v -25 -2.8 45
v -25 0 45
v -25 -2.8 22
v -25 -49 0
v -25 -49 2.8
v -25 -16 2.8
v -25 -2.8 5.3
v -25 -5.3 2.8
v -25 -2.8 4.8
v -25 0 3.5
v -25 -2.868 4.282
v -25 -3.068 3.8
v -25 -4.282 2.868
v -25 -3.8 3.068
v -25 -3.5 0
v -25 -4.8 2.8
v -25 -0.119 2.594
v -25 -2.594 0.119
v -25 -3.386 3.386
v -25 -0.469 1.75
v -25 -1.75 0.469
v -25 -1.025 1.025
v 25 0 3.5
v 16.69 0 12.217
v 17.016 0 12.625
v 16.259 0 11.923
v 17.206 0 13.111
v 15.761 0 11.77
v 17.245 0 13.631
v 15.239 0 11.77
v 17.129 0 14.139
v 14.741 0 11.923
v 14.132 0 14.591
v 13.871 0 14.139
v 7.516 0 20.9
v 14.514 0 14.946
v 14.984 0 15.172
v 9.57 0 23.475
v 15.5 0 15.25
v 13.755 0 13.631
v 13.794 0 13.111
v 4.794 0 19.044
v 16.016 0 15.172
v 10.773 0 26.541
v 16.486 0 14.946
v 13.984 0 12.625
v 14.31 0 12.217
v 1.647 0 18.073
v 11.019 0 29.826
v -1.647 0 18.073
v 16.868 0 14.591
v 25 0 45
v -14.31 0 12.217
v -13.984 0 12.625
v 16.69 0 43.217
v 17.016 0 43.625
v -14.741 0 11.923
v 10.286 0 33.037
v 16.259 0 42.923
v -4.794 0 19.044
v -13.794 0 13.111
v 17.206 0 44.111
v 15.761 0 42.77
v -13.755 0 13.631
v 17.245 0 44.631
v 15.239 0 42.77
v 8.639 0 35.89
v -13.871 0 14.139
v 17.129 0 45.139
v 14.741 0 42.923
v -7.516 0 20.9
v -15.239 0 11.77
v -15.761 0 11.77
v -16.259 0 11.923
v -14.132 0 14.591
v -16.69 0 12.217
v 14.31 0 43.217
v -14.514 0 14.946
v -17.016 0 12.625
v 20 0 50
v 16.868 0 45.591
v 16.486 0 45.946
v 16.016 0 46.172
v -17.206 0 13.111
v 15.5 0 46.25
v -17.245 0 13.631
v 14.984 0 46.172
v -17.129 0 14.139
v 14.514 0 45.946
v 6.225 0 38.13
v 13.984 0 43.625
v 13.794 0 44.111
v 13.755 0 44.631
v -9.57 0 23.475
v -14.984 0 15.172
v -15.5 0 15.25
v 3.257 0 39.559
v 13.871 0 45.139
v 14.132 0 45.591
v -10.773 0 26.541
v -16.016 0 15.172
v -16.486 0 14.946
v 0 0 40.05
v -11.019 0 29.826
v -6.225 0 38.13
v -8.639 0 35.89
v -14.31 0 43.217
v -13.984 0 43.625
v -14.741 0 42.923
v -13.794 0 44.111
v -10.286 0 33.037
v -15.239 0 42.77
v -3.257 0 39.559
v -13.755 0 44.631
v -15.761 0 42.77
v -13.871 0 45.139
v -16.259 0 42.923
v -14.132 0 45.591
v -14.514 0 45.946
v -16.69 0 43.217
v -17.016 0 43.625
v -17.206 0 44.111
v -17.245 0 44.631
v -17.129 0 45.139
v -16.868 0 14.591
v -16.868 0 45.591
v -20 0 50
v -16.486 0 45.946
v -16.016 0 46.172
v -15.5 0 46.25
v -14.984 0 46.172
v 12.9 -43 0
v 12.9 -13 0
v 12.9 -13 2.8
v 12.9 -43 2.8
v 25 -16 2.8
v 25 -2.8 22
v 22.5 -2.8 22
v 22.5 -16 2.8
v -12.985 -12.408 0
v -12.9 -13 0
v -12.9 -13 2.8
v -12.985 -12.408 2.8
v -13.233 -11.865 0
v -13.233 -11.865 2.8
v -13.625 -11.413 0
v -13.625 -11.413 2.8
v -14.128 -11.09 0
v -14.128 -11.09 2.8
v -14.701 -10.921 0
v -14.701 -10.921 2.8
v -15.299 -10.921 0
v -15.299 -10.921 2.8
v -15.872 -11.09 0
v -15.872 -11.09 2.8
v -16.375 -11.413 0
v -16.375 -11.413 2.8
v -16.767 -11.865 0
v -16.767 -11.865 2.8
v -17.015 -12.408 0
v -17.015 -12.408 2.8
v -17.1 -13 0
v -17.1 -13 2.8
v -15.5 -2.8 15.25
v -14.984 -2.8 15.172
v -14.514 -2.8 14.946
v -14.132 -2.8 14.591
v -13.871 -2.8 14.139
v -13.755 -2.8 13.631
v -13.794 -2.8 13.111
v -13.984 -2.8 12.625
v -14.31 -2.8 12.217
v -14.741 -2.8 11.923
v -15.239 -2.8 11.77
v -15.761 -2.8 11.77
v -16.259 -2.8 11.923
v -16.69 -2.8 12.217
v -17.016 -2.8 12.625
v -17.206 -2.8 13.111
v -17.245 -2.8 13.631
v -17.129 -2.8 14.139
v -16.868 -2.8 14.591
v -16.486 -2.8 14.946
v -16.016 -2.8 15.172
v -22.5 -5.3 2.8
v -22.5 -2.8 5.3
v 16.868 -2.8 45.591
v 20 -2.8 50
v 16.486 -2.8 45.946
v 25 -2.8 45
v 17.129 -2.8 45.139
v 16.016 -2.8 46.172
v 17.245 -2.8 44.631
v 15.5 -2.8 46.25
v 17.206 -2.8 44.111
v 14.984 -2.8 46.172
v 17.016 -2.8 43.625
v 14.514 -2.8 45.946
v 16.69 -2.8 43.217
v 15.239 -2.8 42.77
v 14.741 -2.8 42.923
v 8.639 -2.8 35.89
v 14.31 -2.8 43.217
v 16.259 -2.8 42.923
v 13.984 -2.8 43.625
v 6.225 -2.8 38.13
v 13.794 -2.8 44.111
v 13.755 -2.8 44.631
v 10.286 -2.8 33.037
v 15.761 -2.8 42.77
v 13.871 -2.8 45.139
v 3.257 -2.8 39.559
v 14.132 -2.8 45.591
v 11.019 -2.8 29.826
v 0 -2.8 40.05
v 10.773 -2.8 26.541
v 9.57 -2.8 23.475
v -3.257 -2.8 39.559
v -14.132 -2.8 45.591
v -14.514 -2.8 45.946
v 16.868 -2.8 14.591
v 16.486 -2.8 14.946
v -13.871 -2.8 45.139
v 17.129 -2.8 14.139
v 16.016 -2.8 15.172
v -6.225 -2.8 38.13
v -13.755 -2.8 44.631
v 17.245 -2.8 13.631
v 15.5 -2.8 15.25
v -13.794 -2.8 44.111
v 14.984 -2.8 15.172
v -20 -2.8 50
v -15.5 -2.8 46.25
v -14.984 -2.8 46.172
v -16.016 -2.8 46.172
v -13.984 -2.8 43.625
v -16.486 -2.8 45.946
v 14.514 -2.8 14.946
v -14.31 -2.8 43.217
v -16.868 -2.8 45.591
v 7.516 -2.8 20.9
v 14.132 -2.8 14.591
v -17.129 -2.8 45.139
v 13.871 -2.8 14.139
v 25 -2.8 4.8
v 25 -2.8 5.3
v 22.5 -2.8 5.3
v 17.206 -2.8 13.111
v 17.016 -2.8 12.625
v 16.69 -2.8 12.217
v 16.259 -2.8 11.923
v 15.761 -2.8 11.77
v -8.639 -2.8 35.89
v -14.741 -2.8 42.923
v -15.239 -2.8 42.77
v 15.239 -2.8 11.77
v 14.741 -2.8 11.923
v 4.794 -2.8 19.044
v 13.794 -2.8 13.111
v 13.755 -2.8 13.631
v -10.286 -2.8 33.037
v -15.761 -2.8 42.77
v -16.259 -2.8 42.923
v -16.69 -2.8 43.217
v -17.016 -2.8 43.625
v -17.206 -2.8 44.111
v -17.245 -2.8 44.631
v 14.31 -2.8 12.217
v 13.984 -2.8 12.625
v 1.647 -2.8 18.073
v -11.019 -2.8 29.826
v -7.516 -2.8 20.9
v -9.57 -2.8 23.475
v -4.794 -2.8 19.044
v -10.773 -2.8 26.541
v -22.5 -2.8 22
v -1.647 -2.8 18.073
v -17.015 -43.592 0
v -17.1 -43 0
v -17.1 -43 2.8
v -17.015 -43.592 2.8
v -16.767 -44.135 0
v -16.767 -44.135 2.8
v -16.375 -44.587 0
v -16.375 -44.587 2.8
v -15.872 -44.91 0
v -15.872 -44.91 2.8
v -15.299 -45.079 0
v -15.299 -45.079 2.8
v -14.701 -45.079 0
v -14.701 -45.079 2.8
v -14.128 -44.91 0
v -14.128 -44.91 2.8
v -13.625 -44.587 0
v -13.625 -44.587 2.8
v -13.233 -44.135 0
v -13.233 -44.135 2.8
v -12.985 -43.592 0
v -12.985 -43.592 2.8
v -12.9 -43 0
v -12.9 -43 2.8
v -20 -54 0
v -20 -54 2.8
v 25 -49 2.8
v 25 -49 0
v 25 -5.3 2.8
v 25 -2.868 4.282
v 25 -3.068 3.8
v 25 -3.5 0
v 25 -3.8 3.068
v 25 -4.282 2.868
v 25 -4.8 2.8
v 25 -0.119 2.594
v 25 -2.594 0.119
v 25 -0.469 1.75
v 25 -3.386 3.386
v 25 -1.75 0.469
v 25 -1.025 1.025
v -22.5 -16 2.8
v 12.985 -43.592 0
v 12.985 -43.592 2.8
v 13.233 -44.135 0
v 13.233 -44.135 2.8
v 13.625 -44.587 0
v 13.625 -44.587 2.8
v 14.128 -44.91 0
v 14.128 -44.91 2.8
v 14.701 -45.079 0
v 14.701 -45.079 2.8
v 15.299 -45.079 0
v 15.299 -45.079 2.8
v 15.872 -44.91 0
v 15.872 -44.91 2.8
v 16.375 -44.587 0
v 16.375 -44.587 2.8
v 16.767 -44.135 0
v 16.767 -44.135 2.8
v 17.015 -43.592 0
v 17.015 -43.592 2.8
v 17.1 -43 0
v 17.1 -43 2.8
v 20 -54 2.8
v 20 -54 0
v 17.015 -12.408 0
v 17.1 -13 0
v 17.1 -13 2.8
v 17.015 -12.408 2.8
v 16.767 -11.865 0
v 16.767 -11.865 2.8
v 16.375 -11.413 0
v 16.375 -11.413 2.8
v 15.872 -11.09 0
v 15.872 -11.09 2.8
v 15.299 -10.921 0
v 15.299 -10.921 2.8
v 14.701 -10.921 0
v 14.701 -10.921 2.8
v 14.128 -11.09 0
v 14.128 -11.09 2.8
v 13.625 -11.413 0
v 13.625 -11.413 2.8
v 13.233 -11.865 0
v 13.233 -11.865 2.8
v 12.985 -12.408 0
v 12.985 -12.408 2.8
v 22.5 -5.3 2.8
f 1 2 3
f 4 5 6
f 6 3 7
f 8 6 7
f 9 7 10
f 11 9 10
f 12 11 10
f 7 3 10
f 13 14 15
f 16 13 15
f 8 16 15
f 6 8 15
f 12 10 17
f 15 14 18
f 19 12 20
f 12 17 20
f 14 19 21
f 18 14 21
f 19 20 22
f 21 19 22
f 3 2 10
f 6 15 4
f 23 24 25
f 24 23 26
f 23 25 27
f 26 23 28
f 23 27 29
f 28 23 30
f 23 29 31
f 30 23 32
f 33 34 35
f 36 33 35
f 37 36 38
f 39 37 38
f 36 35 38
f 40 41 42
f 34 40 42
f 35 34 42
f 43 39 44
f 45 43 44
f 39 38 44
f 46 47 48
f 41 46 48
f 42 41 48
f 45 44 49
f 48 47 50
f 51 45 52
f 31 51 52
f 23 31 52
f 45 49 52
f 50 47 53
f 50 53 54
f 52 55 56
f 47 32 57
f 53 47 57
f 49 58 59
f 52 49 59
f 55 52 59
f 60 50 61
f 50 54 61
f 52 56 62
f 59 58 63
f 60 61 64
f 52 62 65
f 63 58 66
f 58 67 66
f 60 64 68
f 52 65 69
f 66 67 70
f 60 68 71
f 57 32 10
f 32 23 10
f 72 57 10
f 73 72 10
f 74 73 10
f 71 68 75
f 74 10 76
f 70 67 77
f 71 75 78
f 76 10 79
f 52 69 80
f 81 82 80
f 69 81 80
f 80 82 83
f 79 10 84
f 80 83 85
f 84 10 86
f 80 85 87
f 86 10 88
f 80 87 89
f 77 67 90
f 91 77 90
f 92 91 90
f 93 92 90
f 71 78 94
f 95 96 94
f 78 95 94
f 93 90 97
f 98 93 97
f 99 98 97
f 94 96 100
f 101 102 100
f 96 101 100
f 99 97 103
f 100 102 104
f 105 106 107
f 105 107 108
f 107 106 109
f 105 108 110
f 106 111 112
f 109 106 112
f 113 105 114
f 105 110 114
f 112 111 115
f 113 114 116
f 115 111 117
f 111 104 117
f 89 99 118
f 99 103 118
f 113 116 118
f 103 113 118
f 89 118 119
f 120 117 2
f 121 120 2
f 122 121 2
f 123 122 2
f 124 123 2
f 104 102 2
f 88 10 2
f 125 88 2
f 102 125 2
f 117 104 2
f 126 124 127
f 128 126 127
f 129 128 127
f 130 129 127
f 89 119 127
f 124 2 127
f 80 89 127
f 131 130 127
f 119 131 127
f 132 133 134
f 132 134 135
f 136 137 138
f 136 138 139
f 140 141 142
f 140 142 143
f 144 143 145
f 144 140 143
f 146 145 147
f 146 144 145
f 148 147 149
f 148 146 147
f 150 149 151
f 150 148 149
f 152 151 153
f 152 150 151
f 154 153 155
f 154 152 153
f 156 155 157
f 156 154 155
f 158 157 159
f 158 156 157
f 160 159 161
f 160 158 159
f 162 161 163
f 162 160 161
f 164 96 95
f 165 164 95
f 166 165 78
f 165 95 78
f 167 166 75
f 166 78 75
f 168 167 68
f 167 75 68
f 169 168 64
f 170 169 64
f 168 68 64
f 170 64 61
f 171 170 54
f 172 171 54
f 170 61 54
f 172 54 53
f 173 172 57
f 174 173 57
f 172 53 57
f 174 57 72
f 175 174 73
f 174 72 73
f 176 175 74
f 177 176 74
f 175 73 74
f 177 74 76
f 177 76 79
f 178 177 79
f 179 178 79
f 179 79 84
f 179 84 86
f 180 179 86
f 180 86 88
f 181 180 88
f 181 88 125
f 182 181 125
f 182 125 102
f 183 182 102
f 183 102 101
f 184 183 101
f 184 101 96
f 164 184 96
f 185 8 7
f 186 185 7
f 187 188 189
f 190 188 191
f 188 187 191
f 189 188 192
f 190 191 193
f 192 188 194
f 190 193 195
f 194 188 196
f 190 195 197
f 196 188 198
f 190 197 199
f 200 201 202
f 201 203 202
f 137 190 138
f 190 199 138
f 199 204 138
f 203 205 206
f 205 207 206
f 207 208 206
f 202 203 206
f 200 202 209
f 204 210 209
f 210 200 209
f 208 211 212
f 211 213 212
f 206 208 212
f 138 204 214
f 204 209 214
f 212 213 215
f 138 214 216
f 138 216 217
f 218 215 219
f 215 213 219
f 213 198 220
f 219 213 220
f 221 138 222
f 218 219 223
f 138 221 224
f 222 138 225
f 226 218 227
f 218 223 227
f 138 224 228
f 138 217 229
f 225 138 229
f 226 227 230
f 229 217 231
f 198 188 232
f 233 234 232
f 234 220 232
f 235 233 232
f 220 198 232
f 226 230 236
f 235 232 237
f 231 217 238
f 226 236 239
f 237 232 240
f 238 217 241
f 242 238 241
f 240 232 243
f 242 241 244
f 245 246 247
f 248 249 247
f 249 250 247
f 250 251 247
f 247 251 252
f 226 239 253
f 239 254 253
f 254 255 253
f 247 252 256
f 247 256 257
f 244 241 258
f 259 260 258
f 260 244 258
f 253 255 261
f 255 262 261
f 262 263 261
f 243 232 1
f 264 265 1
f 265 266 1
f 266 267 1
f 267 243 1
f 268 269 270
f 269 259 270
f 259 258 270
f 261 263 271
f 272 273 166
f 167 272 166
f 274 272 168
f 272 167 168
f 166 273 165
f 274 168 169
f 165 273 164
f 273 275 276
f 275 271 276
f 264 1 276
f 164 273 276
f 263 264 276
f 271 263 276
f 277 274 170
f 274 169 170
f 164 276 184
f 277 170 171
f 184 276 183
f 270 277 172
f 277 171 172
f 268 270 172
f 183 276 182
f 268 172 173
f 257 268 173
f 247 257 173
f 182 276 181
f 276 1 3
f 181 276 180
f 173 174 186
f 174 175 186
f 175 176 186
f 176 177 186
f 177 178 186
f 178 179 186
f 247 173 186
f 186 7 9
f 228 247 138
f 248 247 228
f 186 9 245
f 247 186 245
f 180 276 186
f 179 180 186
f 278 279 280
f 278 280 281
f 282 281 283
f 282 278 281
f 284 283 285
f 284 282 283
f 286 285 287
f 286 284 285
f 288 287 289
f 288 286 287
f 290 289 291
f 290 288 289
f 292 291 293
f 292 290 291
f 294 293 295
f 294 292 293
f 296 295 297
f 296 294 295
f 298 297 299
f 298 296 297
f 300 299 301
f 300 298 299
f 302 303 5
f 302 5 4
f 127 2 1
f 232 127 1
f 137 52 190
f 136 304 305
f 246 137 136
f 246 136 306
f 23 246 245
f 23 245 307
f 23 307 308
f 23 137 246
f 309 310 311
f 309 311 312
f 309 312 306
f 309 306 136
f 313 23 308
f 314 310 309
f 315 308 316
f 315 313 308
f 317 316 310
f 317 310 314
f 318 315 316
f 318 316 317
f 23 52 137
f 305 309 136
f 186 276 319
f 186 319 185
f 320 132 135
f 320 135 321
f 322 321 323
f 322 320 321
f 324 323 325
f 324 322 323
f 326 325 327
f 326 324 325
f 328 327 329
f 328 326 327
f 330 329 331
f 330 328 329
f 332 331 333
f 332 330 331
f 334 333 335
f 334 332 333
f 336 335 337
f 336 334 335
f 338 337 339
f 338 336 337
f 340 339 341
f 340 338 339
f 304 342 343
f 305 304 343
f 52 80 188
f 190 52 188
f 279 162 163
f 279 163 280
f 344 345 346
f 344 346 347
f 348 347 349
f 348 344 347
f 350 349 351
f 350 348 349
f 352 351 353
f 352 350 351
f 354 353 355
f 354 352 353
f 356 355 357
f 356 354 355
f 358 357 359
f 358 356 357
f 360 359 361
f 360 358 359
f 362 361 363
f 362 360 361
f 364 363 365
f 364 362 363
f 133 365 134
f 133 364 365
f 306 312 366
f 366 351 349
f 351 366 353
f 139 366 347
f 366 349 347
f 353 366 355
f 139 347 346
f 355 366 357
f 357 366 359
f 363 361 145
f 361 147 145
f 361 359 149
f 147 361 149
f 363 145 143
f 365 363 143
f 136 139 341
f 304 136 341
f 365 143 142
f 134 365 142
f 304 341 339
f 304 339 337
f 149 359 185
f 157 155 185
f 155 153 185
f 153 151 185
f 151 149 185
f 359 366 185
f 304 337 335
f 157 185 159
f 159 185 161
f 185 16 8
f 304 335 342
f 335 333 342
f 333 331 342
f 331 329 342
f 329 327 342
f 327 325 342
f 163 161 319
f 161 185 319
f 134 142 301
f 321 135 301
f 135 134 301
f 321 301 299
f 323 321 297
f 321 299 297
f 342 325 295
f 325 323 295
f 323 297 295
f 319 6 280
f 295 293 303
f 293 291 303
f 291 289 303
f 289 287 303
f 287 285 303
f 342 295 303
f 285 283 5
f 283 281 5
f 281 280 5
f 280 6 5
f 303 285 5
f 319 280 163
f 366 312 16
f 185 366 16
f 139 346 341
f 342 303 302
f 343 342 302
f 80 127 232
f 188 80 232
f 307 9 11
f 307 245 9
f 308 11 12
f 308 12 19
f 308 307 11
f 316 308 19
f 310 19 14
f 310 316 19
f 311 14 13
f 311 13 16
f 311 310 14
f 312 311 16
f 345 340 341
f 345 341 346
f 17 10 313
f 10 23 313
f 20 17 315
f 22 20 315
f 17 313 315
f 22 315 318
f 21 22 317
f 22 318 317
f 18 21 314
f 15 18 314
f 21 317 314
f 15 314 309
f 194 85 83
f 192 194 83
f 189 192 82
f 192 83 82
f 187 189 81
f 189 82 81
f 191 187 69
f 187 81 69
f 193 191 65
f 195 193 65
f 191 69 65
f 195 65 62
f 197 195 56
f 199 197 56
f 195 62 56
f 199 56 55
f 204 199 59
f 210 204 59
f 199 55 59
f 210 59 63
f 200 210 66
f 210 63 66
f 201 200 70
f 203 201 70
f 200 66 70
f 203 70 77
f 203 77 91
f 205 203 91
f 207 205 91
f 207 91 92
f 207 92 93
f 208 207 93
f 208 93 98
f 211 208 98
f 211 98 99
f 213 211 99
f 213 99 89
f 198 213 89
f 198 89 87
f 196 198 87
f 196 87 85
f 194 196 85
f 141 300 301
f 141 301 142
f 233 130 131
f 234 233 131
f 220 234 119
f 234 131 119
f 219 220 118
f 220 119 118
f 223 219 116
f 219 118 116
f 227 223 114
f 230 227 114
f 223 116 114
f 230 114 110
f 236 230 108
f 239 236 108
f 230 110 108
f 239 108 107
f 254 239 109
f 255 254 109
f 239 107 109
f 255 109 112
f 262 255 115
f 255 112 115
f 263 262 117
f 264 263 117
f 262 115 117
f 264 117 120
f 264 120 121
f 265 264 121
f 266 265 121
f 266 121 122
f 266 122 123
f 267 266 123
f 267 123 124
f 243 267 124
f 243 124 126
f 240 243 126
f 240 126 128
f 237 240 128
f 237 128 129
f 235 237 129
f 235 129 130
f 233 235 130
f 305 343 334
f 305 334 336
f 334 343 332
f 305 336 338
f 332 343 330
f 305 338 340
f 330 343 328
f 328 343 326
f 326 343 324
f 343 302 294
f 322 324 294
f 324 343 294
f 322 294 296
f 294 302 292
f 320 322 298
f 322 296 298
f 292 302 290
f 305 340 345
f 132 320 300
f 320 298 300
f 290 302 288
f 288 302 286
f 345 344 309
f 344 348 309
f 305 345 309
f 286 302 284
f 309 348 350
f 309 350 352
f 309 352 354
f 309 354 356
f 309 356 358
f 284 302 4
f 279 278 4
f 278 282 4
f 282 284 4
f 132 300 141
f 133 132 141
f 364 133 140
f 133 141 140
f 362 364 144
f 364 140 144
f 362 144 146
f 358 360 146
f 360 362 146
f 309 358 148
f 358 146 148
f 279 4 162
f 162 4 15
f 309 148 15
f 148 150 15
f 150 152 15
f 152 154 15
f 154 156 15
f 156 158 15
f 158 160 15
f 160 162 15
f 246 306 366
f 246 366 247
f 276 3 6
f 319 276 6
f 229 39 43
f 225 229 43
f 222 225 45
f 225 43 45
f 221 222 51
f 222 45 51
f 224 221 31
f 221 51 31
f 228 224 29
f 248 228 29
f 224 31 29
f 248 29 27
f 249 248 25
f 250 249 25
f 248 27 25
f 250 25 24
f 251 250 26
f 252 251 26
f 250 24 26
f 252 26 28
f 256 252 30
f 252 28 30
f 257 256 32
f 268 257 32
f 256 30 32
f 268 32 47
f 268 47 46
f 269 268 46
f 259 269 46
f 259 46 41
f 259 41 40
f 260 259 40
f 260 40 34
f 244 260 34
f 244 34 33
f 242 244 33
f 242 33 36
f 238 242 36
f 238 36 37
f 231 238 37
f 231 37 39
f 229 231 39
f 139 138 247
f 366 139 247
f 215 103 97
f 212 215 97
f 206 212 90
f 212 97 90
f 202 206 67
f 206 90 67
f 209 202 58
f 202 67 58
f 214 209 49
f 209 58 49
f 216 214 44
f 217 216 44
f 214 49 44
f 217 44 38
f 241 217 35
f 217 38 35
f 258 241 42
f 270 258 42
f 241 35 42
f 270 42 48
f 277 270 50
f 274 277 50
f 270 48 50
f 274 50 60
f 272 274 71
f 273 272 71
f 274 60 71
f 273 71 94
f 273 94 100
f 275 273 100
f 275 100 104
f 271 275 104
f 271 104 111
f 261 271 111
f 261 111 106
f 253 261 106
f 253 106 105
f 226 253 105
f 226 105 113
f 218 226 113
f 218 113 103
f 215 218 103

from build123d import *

# Parameters (mm, degrees)
BOSS_EXTRUDE1_DEPTH      = 25
BOSS_EXTRUDE1_DEPTH_BACK = 25
SKETCH3_R                = 11.05
SKETCH3_R_2              = 1.75
CUT_EXTRUDE1_DEPTH       = 78.723870207
CUT_EXTRUDE2_DEPTH       = 78.723870207
CHAMFER1_SIZE            = 5
FILLET1_R                = 2
FILLET2_R                = 3.5
BOSS_EXTRUDE2_DEPTH      = 2.5


with BuildPart() as part:
    # Sketch1 → Boss-Extrude1 (new, two sides: drawn at the far end of the back side and taken through both)
    with BuildSketch(Plane(origin=(0, 0, 0), x_dir=(0, 0, -1), z_dir=(1, 0, 0)).offset(-BOSS_EXTRUDE1_DEPTH_BACK)):
        Polygon((-50, 0), (-50, -2.8), (-2.8, -2.8), (-2.8, -54), (0, -54), (0, 0), align=None)
    extrude(amount=BOSS_EXTRUDE1_DEPTH + BOSS_EXTRUDE1_DEPTH_BACK)

    # Sketch3 → Cut-Extrude1 (cut, through all)
    with BuildSketch(Plane(origin=(0, 0, 0), x_dir=(1, 0, 0), z_dir=(0, 1, 0))):
        with Locations((0, -29)):
            Circle(SKETCH3_R)
        with Locations((-15.5, -13.5)):
            Circle(SKETCH3_R_2)
        with Locations((15.5, -13.5)):
            Circle(SKETCH3_R_2)
        with Locations((15.5, -44.5)):
            Circle(SKETCH3_R_2)
        with Locations((-15.5, -44.5)):
            Circle(SKETCH3_R_2)
    extrude(amount=-CUT_EXTRUDE1_DEPTH, mode=Mode.SUBTRACT)

    # Sketch4 → Cut-Extrude2 (cut, through all)
    with BuildSketch(Plane(origin=(0, 0, 0), x_dir=(-1, 0, 0), z_dir=(0, 0, -1))):
        with BuildLine():
            Line((-17.1, -43), (-17.1, -13))
            ThreePointArc((-17.1, -13), (-15, -10.9), (-12.9, -13))
            Line((-12.9, -13), (-12.9, -43))
            ThreePointArc((-12.9, -43), (-15, -45.1), (-17.1, -43))
        make_face()
        with BuildLine():
            Line((12.9, -43), (12.9, -13))
            ThreePointArc((12.9, -13), (15, -10.9), (17.1, -13))
            Line((17.1, -13), (17.1, -43))
            ThreePointArc((17.1, -43), (15, -45.1), (12.9, -43))
        make_face()
    extrude(amount=-CUT_EXTRUDE2_DEPTH, mode=Mode.SUBTRACT)

    # Chamfer1
    chamfer1_edges = [part.edges().sort_by_distance(p)[0] for p in [
        (25, -54, 1.4),
        (-25, -54, 1.4),
        (-25, -1.4, 50),
        (25, -1.4, 50),
    ]]
    chamfer(chamfer1_edges, length=CHAMFER1_SIZE)

    # Fillet1
    fillet1_edges = [part.edges().sort_by_distance(p)[0] for p in [
        (0, -2.8, 2.8),
    ]]
    fillet(fillet1_edges, radius=FILLET1_R)

    # Fillet2
    fillet2_edges = [part.edges().sort_by_distance(p)[0] for p in [
        (0, 0, 0),
    ]]
    fillet(fillet2_edges, radius=FILLET2_R)

    # Sketch5 → Boss-Extrude2 (add)
    with BuildSketch(Plane.ZY.offset(25)):
        Polygon((2.8, -5.3), (5.3, -2.8), (22, -2.8), (2.8, -16), align=None)
    boss_extrude2 = extrude(amount=-BOSS_EXTRUDE2_DEPTH)

    # Mirror1: Boss-Extrude2 across plane
    add(boss_extrude2.mirror(Plane(origin=(0, 0, 0), x_dir=(0, 0, 1), z_dir=(1, 0, 0))))


solid = part.part
